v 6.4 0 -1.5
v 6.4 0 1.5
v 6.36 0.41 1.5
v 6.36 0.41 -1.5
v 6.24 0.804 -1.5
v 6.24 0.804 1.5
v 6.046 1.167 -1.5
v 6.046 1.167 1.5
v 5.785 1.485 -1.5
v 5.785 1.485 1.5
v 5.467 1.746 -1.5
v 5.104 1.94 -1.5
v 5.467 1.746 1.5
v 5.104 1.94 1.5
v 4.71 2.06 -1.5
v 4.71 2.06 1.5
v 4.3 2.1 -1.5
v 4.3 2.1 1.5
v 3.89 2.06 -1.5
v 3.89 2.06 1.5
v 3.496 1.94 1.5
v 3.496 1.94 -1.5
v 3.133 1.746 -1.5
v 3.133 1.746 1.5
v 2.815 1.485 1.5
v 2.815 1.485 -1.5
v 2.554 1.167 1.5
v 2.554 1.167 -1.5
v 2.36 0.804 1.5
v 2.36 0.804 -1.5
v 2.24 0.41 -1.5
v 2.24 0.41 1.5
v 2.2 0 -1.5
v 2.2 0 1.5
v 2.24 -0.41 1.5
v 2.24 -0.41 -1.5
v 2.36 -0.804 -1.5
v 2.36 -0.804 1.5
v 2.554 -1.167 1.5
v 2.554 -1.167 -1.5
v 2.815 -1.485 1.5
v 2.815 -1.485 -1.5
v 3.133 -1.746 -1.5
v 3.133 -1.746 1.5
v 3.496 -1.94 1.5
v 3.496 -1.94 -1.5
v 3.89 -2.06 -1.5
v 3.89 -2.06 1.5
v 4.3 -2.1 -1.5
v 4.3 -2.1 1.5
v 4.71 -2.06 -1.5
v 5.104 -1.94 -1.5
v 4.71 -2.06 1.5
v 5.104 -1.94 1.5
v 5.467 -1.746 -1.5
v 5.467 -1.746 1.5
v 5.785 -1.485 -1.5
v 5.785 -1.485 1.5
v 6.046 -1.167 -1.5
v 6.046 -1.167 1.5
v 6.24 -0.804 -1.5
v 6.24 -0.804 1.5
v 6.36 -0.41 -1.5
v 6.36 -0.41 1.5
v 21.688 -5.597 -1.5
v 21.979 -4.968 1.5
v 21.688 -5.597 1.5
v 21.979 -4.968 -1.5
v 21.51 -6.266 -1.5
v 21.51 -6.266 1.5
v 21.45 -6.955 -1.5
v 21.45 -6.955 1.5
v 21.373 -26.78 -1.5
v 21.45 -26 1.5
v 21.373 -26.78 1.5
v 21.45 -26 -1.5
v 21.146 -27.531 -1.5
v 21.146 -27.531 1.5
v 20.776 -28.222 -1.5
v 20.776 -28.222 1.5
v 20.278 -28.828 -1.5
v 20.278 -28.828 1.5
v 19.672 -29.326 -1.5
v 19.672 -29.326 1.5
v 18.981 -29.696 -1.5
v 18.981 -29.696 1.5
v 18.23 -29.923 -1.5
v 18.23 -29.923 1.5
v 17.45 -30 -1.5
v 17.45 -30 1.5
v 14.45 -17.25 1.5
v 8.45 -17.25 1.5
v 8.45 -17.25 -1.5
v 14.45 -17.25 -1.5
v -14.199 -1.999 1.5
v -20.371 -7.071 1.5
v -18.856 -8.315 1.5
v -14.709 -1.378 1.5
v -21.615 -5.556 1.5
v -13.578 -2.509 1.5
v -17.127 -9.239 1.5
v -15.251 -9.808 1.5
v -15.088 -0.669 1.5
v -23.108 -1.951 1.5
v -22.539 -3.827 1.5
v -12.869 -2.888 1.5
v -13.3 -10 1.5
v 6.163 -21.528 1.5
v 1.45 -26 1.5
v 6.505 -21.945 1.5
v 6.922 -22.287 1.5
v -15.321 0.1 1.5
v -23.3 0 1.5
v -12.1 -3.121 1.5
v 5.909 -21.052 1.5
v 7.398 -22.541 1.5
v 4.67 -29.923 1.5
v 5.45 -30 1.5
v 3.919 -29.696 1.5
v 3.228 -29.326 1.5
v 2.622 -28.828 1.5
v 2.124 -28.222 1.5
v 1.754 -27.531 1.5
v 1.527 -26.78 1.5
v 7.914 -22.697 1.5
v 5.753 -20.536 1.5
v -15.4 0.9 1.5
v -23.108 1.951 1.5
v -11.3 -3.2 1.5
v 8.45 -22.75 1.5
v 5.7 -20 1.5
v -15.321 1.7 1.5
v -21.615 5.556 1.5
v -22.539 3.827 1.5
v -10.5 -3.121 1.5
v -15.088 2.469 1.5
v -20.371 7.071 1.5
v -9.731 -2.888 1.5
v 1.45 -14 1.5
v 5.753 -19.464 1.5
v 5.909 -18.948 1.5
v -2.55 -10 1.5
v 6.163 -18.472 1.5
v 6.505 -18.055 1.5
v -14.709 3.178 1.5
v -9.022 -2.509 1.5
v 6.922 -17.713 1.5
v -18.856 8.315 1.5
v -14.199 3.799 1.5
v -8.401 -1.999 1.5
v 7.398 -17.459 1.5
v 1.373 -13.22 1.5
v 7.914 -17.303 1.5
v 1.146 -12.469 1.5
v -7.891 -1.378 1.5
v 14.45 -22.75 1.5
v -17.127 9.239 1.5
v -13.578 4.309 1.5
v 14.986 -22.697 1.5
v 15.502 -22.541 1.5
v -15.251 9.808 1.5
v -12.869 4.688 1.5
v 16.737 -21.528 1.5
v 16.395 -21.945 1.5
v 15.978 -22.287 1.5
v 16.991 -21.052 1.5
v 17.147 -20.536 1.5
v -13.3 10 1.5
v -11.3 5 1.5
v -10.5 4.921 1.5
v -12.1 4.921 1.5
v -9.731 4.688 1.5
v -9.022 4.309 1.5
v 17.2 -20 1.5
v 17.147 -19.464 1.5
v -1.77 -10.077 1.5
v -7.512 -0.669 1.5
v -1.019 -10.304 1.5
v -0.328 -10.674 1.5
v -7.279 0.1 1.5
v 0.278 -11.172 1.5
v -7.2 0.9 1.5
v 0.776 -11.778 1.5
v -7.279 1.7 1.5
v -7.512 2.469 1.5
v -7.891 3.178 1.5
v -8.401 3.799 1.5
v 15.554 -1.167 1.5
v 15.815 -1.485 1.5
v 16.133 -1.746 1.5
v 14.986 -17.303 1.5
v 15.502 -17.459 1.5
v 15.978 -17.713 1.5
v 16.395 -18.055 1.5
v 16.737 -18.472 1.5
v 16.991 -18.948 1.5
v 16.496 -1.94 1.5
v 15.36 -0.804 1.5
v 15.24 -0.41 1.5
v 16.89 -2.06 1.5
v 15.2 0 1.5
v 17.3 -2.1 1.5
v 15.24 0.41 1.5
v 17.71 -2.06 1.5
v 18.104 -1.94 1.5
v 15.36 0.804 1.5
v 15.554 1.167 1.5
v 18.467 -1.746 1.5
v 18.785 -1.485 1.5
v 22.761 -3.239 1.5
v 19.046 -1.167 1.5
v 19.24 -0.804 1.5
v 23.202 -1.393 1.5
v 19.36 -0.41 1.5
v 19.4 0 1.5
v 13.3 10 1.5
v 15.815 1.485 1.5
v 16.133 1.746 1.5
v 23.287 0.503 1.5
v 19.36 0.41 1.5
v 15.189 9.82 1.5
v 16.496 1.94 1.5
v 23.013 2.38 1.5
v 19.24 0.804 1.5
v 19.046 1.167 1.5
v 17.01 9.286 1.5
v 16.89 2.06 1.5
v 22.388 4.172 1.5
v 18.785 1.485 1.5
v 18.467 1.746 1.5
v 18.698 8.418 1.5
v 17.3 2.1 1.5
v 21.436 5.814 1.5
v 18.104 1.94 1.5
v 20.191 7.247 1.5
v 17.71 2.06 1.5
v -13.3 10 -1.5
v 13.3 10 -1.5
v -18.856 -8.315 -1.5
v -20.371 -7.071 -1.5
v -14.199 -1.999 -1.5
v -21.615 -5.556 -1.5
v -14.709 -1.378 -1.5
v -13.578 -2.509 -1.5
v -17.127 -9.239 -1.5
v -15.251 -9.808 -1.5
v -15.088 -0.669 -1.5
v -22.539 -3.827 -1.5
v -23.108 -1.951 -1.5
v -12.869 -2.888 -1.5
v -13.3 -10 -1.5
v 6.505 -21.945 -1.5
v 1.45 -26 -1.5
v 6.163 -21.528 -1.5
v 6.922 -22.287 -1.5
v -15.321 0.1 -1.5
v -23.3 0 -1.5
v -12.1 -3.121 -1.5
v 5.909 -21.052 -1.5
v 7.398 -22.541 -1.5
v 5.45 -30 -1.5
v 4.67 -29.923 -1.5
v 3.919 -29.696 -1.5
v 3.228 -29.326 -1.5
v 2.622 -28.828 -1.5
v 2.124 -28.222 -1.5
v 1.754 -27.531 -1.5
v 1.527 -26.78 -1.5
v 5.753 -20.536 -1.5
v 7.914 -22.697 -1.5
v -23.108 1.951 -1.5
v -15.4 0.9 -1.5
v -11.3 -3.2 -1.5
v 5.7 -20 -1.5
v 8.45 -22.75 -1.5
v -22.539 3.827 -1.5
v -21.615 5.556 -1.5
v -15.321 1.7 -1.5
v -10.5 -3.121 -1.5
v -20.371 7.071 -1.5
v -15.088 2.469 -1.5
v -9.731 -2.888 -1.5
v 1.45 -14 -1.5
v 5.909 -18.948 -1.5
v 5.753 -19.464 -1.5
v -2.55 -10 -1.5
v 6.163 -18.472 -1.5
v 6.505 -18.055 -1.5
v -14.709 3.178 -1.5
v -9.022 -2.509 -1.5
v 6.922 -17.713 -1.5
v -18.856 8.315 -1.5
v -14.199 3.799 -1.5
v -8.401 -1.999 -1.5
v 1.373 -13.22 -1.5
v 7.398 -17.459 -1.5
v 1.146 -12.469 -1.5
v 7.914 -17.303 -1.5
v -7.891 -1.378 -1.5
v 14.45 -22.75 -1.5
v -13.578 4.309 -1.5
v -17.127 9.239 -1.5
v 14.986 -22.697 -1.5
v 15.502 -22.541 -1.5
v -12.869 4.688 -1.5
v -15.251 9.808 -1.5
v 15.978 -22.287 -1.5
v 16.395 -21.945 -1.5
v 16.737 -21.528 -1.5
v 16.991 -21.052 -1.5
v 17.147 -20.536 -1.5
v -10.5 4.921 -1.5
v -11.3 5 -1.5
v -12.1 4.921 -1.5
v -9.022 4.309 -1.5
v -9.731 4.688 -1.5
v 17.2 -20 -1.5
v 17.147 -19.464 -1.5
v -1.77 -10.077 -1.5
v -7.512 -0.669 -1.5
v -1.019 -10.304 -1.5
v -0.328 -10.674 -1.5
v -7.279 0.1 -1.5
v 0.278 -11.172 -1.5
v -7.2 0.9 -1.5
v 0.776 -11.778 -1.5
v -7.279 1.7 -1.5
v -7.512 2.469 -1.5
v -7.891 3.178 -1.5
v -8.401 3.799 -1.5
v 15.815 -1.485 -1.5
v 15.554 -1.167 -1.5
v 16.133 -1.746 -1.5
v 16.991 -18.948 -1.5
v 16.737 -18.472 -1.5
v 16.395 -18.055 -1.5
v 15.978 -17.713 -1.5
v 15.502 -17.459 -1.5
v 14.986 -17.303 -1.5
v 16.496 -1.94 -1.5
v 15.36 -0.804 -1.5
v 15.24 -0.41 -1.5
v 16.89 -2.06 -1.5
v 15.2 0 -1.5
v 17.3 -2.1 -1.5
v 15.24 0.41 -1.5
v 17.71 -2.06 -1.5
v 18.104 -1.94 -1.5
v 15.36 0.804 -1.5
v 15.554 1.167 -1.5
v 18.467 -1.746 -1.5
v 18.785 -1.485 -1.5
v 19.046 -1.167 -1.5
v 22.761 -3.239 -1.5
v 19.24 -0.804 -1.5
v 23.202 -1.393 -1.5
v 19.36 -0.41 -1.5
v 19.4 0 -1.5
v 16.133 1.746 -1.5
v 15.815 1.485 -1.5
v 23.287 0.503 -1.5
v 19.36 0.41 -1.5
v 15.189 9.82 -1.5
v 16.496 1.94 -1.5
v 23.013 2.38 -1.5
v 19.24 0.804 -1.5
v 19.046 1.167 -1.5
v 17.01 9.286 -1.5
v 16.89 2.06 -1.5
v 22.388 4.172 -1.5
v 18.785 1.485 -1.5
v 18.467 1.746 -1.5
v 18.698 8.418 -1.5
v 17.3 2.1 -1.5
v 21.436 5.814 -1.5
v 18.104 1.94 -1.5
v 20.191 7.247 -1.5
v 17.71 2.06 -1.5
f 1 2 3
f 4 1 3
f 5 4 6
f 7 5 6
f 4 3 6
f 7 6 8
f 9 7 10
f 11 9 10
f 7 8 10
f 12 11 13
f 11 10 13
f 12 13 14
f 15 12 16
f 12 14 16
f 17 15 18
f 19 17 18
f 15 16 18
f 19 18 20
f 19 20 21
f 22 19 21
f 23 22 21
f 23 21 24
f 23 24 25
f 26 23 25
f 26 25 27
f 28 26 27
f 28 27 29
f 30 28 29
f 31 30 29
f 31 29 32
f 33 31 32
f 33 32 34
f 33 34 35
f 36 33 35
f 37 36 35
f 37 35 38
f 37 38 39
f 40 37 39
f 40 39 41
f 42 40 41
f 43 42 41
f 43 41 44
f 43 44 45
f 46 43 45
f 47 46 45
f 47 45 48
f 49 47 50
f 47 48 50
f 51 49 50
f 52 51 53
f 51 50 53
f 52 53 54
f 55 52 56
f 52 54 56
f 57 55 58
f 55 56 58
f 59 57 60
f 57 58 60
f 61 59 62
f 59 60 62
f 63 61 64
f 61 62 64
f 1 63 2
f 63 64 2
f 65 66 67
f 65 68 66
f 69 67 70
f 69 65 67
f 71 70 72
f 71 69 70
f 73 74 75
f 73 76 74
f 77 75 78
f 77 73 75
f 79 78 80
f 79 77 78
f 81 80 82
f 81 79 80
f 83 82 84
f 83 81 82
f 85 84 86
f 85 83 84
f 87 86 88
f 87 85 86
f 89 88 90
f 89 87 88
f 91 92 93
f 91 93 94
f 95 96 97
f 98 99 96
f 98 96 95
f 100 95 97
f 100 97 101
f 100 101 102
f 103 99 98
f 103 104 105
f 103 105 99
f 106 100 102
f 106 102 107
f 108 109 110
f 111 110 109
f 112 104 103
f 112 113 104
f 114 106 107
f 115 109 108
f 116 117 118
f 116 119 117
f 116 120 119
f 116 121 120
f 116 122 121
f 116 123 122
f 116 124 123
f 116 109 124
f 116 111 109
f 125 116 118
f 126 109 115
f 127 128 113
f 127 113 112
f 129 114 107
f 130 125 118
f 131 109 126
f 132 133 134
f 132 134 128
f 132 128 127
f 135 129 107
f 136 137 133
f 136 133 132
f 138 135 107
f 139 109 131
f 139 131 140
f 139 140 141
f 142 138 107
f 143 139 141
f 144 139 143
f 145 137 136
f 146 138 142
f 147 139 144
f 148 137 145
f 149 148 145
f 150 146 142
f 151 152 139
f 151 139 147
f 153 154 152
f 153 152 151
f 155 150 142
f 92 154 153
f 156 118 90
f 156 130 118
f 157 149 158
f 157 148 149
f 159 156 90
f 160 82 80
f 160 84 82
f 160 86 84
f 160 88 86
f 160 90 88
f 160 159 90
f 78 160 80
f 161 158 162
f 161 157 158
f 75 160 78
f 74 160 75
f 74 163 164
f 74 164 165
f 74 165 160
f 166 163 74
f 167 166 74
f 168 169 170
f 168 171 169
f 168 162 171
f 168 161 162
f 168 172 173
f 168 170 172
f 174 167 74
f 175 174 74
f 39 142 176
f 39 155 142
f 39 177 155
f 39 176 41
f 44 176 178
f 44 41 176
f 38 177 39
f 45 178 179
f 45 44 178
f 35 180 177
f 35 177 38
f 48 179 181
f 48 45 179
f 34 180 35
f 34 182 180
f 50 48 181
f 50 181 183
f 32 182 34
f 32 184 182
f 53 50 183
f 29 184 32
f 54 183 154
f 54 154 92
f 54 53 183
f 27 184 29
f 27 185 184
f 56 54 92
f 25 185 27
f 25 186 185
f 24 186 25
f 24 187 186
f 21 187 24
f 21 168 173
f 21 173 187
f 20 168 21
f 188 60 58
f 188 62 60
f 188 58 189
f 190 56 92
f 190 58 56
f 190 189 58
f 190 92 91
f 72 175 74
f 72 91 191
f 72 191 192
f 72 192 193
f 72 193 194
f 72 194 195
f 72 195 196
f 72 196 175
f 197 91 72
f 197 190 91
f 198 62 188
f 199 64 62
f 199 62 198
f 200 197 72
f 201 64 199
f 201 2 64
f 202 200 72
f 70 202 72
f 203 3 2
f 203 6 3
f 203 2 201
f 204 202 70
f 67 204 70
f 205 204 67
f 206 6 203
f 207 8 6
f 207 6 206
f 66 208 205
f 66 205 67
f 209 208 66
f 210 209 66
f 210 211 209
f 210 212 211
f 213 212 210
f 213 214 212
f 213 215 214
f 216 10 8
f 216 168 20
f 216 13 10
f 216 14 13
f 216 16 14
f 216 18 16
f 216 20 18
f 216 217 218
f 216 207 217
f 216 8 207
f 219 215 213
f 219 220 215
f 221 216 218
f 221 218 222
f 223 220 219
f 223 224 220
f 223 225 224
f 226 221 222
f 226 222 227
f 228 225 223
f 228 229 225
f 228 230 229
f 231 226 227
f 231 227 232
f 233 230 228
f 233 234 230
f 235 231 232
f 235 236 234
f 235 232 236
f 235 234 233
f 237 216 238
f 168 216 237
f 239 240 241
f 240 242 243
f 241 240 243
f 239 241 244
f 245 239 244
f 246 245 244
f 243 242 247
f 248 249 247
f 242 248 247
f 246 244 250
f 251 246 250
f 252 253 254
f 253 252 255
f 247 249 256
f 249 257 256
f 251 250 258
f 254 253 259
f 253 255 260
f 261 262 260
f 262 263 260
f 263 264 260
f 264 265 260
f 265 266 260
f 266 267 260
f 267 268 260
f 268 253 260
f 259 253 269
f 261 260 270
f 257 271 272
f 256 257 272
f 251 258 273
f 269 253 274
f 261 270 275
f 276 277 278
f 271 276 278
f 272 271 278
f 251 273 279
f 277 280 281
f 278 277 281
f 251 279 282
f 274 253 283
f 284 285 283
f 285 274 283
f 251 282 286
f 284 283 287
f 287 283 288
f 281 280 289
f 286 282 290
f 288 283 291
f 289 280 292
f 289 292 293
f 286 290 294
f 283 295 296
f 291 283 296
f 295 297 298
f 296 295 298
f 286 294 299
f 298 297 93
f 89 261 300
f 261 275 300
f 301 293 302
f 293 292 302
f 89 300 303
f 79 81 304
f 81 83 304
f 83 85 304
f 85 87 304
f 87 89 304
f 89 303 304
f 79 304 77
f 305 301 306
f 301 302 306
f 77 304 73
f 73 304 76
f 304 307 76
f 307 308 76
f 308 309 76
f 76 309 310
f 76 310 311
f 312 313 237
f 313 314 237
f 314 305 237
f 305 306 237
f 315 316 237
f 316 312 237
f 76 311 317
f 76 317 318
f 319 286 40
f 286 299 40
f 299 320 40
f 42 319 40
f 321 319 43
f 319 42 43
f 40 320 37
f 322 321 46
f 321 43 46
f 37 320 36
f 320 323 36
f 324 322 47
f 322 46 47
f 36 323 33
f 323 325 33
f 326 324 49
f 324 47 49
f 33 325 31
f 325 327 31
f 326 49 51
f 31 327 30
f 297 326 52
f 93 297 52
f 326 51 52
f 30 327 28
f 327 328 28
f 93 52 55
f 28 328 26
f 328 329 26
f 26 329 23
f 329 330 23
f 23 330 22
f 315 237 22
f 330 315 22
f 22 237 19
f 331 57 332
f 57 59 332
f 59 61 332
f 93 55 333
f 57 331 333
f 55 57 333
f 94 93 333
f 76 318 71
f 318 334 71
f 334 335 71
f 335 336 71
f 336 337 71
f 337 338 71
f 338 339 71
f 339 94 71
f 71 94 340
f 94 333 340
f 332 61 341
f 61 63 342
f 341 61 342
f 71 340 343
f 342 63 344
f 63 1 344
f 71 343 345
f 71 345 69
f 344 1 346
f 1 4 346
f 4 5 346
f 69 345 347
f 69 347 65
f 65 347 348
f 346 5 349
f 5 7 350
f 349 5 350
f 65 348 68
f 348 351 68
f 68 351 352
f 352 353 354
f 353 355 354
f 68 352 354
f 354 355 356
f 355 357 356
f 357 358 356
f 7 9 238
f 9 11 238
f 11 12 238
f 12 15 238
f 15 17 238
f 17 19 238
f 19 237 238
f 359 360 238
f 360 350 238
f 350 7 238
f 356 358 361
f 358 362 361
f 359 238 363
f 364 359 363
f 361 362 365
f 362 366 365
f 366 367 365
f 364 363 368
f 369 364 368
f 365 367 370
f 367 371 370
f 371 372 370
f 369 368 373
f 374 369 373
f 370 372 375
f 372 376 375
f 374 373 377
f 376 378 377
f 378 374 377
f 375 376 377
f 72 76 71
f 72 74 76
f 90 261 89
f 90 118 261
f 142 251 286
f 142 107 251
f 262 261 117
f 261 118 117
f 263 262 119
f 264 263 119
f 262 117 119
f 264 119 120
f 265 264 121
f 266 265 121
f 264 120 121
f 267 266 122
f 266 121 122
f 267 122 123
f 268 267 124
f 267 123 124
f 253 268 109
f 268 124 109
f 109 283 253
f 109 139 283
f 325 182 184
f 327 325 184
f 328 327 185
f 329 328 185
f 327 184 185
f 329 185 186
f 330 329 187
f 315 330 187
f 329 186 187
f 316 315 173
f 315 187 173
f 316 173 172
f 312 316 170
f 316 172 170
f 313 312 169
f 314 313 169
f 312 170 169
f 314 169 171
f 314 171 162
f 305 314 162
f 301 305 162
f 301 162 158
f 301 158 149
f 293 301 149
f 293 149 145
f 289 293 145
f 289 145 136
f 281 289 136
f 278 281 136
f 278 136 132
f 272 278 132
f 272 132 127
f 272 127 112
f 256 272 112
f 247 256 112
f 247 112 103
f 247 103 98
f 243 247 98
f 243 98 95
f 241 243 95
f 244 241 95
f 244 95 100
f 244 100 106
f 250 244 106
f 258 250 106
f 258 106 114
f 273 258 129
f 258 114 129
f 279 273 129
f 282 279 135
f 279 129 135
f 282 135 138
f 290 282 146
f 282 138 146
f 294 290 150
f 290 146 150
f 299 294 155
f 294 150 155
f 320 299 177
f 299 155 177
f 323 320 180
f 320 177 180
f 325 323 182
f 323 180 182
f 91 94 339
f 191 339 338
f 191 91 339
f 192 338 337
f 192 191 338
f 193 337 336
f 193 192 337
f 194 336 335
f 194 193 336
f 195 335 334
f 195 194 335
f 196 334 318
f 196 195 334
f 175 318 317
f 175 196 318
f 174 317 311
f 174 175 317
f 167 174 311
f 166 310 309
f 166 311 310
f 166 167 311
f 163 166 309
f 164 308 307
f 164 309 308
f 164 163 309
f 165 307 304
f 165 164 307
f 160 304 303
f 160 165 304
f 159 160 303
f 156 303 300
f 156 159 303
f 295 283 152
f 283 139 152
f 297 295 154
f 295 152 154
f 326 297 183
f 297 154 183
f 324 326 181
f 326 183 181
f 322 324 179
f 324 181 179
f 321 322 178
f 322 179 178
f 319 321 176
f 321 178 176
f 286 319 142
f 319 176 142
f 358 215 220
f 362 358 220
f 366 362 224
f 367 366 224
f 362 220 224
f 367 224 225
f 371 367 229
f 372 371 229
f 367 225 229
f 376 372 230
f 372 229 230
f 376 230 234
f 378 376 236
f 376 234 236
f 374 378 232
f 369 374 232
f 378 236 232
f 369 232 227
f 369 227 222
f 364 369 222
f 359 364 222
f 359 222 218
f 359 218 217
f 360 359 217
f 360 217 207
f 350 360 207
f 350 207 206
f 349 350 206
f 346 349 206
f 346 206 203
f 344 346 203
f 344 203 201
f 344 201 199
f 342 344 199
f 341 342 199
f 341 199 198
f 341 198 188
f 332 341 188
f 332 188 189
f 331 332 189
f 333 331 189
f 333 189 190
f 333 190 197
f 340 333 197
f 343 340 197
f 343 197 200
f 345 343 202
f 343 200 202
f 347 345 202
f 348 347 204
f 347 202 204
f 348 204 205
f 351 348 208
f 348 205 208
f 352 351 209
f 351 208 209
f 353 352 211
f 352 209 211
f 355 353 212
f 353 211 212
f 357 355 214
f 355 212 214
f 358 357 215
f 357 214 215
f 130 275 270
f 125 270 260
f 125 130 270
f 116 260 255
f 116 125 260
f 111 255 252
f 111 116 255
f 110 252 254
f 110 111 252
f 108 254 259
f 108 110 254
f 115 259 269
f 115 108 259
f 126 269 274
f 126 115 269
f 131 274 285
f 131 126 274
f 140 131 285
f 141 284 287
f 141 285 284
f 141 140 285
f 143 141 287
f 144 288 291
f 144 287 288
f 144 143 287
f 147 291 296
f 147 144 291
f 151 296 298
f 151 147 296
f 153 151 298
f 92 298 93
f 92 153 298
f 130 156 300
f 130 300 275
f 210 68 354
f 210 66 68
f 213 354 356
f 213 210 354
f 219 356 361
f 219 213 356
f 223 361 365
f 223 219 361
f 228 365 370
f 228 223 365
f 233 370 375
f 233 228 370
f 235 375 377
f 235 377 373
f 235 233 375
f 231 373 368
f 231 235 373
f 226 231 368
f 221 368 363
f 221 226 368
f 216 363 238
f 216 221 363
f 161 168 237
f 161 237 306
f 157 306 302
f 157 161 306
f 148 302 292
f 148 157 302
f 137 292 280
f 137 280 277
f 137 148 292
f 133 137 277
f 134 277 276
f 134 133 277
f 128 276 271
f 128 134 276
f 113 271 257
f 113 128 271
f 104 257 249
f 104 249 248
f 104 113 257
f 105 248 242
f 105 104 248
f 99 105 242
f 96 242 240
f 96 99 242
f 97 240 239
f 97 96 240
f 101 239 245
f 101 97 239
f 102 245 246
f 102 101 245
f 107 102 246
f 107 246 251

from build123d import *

# Parameters (mm, degrees)
BOSS_EXTRUDE1_DEPTH = 1.5
FILLET1_R           = 4
SKETCH2_R           = 4.1
SKETCH2_R_2         = 2.1
CUT_EXTRUDE1_DEPTH  = 39.103674364


with BuildPart() as part:
    # Sketch1 → Boss-Extrude1 (new, symmetric)
    with BuildSketch(Plane.XY):
        with BuildLine():
            Line((13.3, 10), (-13.3, 10))
            ThreePointArc((-13.3, 10), (-23.3, 0), (-13.3, -10))
            Line((-13.3, -10), (1.45, -10))
            Line((1.45, -10), (1.45, -30))
            Line((1.45, -30), (21.45, -30))
            Line((21.45, -30), (21.45, -5.794609564))
            ThreePointArc((21.45, -5.794609564), (22.186678109, 4.585515476), (13.3, 10))
        make_face()
    extrude(amount=BOSS_EXTRUDE1_DEPTH, both=True)

    # Fillet1
    fillet1_edges = [part.edges().sort_by_distance(p)[0] for p in [
        (21.45, -5.794609564, 0),
        (21.45, -30, 0),
        (1.45, -30, 0),
        (1.45, -10, 0),
    ]]
    fillet(fillet1_edges, radius=FILLET1_R)

    # Sketch2 → Cut-Extrude1 (cut, through all)
    with BuildSketch(Plane.XY.offset(1.5)):
        with Locations((-11.3, 0.9)):
            Circle(SKETCH2_R)
        with Locations((4.3, 0)):
            Circle(SKETCH2_R_2)
        with Locations((17.3, 0)):
            Circle(SKETCH2_R_2)
        with BuildLine():
            Line((8.45, -17.25), (14.45, -17.25))
            ThreePointArc((14.45, -17.25), (17.2, -20), (14.45, -22.75))
            Line((14.45, -22.75), (8.45, -22.75))
            ThreePointArc((8.45, -22.75), (5.7, -20), (8.45, -17.25))
        make_face()
    extrude(amount=-CUT_EXTRUDE1_DEPTH, mode=Mode.SUBTRACT)


solid = part.part
